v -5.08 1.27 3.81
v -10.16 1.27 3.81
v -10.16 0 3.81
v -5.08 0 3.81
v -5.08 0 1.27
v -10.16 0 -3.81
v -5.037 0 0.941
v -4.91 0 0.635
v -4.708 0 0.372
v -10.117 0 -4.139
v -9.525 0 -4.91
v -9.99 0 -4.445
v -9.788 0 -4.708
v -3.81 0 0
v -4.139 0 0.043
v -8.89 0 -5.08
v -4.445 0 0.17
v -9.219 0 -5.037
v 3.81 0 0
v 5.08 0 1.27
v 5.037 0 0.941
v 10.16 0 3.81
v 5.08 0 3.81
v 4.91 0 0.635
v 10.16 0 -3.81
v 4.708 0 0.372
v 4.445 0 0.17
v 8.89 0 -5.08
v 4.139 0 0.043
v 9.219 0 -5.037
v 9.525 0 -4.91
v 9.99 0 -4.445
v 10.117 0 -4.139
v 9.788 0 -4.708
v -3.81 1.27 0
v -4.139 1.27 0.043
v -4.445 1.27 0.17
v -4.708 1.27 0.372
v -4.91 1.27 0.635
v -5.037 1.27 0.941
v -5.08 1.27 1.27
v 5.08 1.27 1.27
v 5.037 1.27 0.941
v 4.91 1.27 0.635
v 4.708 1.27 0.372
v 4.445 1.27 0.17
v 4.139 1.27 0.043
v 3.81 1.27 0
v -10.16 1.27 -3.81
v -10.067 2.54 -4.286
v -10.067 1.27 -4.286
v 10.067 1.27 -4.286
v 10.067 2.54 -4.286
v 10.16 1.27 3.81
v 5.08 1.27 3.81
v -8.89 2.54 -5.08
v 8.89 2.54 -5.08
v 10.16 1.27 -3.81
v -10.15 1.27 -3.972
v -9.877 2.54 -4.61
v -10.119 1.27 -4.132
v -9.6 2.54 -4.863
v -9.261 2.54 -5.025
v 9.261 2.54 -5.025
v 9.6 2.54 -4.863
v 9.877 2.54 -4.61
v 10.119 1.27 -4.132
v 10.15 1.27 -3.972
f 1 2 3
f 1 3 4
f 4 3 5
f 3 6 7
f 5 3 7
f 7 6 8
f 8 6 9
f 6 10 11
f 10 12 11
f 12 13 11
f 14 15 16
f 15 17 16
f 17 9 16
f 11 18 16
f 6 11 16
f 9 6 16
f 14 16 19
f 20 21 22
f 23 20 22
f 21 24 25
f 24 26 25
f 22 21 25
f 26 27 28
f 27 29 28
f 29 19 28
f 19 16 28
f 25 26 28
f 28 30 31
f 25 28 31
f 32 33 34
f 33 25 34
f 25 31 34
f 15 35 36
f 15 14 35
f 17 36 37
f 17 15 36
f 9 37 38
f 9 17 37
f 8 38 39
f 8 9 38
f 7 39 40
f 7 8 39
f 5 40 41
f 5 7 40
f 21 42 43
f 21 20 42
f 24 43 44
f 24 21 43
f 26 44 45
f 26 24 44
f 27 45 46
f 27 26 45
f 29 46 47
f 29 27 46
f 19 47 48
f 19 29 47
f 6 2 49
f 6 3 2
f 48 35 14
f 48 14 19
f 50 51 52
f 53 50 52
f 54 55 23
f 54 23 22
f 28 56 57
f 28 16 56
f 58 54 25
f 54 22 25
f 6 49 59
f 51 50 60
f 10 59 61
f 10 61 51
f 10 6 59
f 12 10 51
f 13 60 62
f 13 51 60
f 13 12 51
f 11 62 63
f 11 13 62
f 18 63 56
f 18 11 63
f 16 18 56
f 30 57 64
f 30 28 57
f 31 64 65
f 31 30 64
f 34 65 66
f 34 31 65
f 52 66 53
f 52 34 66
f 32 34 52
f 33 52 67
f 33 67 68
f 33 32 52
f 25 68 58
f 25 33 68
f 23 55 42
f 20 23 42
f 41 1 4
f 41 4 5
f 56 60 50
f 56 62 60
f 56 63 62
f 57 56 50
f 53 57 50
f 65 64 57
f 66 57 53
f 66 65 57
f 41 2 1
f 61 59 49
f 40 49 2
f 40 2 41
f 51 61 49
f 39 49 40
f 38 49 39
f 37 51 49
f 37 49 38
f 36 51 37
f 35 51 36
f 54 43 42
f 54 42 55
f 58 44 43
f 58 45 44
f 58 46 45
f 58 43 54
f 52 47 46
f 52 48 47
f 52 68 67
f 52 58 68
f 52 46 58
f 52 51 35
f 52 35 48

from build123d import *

# Parameters (mm, degrees)
SKETCH1_W           = 20.32
SKETCH1_H           = 10.16
BOSS_EXTRUDE1_DEPTH = 1.27
SKETCH2_W           = 10.16
SKETCH2_H           = 5.08
CUT_EXTRUDE1_DEPTH  = 12.43
SKETCH4_W           = 20.32
SKETCH4_H           = 0.79375
BOSS_EXTRUDE2_DEPTH = 1.27
SKETCH5_W           = 5.08
SKETCH5_H           = 1.27
CUT_EXTRUDE2_DEPTH  = 1.27
FILLET1_R           = 1.27


with BuildPart() as part:
    # Sketch1 → Boss-Extrude1 (new body)
    with BuildSketch(Plane(origin=(0, 0, 0), x_dir=(1, 0, 0), z_dir=(0, 1, 0))):
        Rectangle(SKETCH1_W, SKETCH1_H)
    extrude(amount=BOSS_EXTRUDE1_DEPTH)

    # Sketch2 → Cut-Extrude1 (cut, through all)
    with BuildSketch(Plane(origin=(0, 1.27, 0), x_dir=(1, 0, 0), z_dir=(0, 1, 0))):
        with Locations((0, -2.54)):
            Rectangle(SKETCH2_W, SKETCH2_H)
    extrude(amount=-CUT_EXTRUDE1_DEPTH, mode=Mode.SUBTRACT)

    # Sketch4 → Boss-Extrude2 (add)
    with BuildSketch(Plane(origin=(0, 1.27, 0), x_dir=(1, 0, 0), z_dir=(0, 1, 0))):
        with Locations((0, 4.683125)):
            Rectangle(SKETCH4_W, SKETCH4_H)
    extrude(amount=BOSS_EXTRUDE2_DEPTH)

    # Sketch5 → Cut-Extrude2 (cut)
    with BuildSketch(Plane.XY.offset(5.08)):
        with Locations((7.62, 0.635)):
            Rectangle(SKETCH5_W, SKETCH5_H)
        with Locations((-7.62, 0.635)):
            Rectangle(SKETCH5_W, SKETCH5_H)
    extrude(amount=-CUT_EXTRUDE2_DEPTH, mode=Mode.SUBTRACT)

    # Fillet1
    fillet1_edges = [part.edges().sort_by_distance(p)[0] for p in [
        (10.16, 1.27, -5.08),
        (5.08, 0.635, 0),
        (-5.08, 0.635, 0),
        (-10.16, 1.27, -5.08),
    ]]
    fillet(fillet1_edges, radius=FILLET1_R)


solid = part.part
